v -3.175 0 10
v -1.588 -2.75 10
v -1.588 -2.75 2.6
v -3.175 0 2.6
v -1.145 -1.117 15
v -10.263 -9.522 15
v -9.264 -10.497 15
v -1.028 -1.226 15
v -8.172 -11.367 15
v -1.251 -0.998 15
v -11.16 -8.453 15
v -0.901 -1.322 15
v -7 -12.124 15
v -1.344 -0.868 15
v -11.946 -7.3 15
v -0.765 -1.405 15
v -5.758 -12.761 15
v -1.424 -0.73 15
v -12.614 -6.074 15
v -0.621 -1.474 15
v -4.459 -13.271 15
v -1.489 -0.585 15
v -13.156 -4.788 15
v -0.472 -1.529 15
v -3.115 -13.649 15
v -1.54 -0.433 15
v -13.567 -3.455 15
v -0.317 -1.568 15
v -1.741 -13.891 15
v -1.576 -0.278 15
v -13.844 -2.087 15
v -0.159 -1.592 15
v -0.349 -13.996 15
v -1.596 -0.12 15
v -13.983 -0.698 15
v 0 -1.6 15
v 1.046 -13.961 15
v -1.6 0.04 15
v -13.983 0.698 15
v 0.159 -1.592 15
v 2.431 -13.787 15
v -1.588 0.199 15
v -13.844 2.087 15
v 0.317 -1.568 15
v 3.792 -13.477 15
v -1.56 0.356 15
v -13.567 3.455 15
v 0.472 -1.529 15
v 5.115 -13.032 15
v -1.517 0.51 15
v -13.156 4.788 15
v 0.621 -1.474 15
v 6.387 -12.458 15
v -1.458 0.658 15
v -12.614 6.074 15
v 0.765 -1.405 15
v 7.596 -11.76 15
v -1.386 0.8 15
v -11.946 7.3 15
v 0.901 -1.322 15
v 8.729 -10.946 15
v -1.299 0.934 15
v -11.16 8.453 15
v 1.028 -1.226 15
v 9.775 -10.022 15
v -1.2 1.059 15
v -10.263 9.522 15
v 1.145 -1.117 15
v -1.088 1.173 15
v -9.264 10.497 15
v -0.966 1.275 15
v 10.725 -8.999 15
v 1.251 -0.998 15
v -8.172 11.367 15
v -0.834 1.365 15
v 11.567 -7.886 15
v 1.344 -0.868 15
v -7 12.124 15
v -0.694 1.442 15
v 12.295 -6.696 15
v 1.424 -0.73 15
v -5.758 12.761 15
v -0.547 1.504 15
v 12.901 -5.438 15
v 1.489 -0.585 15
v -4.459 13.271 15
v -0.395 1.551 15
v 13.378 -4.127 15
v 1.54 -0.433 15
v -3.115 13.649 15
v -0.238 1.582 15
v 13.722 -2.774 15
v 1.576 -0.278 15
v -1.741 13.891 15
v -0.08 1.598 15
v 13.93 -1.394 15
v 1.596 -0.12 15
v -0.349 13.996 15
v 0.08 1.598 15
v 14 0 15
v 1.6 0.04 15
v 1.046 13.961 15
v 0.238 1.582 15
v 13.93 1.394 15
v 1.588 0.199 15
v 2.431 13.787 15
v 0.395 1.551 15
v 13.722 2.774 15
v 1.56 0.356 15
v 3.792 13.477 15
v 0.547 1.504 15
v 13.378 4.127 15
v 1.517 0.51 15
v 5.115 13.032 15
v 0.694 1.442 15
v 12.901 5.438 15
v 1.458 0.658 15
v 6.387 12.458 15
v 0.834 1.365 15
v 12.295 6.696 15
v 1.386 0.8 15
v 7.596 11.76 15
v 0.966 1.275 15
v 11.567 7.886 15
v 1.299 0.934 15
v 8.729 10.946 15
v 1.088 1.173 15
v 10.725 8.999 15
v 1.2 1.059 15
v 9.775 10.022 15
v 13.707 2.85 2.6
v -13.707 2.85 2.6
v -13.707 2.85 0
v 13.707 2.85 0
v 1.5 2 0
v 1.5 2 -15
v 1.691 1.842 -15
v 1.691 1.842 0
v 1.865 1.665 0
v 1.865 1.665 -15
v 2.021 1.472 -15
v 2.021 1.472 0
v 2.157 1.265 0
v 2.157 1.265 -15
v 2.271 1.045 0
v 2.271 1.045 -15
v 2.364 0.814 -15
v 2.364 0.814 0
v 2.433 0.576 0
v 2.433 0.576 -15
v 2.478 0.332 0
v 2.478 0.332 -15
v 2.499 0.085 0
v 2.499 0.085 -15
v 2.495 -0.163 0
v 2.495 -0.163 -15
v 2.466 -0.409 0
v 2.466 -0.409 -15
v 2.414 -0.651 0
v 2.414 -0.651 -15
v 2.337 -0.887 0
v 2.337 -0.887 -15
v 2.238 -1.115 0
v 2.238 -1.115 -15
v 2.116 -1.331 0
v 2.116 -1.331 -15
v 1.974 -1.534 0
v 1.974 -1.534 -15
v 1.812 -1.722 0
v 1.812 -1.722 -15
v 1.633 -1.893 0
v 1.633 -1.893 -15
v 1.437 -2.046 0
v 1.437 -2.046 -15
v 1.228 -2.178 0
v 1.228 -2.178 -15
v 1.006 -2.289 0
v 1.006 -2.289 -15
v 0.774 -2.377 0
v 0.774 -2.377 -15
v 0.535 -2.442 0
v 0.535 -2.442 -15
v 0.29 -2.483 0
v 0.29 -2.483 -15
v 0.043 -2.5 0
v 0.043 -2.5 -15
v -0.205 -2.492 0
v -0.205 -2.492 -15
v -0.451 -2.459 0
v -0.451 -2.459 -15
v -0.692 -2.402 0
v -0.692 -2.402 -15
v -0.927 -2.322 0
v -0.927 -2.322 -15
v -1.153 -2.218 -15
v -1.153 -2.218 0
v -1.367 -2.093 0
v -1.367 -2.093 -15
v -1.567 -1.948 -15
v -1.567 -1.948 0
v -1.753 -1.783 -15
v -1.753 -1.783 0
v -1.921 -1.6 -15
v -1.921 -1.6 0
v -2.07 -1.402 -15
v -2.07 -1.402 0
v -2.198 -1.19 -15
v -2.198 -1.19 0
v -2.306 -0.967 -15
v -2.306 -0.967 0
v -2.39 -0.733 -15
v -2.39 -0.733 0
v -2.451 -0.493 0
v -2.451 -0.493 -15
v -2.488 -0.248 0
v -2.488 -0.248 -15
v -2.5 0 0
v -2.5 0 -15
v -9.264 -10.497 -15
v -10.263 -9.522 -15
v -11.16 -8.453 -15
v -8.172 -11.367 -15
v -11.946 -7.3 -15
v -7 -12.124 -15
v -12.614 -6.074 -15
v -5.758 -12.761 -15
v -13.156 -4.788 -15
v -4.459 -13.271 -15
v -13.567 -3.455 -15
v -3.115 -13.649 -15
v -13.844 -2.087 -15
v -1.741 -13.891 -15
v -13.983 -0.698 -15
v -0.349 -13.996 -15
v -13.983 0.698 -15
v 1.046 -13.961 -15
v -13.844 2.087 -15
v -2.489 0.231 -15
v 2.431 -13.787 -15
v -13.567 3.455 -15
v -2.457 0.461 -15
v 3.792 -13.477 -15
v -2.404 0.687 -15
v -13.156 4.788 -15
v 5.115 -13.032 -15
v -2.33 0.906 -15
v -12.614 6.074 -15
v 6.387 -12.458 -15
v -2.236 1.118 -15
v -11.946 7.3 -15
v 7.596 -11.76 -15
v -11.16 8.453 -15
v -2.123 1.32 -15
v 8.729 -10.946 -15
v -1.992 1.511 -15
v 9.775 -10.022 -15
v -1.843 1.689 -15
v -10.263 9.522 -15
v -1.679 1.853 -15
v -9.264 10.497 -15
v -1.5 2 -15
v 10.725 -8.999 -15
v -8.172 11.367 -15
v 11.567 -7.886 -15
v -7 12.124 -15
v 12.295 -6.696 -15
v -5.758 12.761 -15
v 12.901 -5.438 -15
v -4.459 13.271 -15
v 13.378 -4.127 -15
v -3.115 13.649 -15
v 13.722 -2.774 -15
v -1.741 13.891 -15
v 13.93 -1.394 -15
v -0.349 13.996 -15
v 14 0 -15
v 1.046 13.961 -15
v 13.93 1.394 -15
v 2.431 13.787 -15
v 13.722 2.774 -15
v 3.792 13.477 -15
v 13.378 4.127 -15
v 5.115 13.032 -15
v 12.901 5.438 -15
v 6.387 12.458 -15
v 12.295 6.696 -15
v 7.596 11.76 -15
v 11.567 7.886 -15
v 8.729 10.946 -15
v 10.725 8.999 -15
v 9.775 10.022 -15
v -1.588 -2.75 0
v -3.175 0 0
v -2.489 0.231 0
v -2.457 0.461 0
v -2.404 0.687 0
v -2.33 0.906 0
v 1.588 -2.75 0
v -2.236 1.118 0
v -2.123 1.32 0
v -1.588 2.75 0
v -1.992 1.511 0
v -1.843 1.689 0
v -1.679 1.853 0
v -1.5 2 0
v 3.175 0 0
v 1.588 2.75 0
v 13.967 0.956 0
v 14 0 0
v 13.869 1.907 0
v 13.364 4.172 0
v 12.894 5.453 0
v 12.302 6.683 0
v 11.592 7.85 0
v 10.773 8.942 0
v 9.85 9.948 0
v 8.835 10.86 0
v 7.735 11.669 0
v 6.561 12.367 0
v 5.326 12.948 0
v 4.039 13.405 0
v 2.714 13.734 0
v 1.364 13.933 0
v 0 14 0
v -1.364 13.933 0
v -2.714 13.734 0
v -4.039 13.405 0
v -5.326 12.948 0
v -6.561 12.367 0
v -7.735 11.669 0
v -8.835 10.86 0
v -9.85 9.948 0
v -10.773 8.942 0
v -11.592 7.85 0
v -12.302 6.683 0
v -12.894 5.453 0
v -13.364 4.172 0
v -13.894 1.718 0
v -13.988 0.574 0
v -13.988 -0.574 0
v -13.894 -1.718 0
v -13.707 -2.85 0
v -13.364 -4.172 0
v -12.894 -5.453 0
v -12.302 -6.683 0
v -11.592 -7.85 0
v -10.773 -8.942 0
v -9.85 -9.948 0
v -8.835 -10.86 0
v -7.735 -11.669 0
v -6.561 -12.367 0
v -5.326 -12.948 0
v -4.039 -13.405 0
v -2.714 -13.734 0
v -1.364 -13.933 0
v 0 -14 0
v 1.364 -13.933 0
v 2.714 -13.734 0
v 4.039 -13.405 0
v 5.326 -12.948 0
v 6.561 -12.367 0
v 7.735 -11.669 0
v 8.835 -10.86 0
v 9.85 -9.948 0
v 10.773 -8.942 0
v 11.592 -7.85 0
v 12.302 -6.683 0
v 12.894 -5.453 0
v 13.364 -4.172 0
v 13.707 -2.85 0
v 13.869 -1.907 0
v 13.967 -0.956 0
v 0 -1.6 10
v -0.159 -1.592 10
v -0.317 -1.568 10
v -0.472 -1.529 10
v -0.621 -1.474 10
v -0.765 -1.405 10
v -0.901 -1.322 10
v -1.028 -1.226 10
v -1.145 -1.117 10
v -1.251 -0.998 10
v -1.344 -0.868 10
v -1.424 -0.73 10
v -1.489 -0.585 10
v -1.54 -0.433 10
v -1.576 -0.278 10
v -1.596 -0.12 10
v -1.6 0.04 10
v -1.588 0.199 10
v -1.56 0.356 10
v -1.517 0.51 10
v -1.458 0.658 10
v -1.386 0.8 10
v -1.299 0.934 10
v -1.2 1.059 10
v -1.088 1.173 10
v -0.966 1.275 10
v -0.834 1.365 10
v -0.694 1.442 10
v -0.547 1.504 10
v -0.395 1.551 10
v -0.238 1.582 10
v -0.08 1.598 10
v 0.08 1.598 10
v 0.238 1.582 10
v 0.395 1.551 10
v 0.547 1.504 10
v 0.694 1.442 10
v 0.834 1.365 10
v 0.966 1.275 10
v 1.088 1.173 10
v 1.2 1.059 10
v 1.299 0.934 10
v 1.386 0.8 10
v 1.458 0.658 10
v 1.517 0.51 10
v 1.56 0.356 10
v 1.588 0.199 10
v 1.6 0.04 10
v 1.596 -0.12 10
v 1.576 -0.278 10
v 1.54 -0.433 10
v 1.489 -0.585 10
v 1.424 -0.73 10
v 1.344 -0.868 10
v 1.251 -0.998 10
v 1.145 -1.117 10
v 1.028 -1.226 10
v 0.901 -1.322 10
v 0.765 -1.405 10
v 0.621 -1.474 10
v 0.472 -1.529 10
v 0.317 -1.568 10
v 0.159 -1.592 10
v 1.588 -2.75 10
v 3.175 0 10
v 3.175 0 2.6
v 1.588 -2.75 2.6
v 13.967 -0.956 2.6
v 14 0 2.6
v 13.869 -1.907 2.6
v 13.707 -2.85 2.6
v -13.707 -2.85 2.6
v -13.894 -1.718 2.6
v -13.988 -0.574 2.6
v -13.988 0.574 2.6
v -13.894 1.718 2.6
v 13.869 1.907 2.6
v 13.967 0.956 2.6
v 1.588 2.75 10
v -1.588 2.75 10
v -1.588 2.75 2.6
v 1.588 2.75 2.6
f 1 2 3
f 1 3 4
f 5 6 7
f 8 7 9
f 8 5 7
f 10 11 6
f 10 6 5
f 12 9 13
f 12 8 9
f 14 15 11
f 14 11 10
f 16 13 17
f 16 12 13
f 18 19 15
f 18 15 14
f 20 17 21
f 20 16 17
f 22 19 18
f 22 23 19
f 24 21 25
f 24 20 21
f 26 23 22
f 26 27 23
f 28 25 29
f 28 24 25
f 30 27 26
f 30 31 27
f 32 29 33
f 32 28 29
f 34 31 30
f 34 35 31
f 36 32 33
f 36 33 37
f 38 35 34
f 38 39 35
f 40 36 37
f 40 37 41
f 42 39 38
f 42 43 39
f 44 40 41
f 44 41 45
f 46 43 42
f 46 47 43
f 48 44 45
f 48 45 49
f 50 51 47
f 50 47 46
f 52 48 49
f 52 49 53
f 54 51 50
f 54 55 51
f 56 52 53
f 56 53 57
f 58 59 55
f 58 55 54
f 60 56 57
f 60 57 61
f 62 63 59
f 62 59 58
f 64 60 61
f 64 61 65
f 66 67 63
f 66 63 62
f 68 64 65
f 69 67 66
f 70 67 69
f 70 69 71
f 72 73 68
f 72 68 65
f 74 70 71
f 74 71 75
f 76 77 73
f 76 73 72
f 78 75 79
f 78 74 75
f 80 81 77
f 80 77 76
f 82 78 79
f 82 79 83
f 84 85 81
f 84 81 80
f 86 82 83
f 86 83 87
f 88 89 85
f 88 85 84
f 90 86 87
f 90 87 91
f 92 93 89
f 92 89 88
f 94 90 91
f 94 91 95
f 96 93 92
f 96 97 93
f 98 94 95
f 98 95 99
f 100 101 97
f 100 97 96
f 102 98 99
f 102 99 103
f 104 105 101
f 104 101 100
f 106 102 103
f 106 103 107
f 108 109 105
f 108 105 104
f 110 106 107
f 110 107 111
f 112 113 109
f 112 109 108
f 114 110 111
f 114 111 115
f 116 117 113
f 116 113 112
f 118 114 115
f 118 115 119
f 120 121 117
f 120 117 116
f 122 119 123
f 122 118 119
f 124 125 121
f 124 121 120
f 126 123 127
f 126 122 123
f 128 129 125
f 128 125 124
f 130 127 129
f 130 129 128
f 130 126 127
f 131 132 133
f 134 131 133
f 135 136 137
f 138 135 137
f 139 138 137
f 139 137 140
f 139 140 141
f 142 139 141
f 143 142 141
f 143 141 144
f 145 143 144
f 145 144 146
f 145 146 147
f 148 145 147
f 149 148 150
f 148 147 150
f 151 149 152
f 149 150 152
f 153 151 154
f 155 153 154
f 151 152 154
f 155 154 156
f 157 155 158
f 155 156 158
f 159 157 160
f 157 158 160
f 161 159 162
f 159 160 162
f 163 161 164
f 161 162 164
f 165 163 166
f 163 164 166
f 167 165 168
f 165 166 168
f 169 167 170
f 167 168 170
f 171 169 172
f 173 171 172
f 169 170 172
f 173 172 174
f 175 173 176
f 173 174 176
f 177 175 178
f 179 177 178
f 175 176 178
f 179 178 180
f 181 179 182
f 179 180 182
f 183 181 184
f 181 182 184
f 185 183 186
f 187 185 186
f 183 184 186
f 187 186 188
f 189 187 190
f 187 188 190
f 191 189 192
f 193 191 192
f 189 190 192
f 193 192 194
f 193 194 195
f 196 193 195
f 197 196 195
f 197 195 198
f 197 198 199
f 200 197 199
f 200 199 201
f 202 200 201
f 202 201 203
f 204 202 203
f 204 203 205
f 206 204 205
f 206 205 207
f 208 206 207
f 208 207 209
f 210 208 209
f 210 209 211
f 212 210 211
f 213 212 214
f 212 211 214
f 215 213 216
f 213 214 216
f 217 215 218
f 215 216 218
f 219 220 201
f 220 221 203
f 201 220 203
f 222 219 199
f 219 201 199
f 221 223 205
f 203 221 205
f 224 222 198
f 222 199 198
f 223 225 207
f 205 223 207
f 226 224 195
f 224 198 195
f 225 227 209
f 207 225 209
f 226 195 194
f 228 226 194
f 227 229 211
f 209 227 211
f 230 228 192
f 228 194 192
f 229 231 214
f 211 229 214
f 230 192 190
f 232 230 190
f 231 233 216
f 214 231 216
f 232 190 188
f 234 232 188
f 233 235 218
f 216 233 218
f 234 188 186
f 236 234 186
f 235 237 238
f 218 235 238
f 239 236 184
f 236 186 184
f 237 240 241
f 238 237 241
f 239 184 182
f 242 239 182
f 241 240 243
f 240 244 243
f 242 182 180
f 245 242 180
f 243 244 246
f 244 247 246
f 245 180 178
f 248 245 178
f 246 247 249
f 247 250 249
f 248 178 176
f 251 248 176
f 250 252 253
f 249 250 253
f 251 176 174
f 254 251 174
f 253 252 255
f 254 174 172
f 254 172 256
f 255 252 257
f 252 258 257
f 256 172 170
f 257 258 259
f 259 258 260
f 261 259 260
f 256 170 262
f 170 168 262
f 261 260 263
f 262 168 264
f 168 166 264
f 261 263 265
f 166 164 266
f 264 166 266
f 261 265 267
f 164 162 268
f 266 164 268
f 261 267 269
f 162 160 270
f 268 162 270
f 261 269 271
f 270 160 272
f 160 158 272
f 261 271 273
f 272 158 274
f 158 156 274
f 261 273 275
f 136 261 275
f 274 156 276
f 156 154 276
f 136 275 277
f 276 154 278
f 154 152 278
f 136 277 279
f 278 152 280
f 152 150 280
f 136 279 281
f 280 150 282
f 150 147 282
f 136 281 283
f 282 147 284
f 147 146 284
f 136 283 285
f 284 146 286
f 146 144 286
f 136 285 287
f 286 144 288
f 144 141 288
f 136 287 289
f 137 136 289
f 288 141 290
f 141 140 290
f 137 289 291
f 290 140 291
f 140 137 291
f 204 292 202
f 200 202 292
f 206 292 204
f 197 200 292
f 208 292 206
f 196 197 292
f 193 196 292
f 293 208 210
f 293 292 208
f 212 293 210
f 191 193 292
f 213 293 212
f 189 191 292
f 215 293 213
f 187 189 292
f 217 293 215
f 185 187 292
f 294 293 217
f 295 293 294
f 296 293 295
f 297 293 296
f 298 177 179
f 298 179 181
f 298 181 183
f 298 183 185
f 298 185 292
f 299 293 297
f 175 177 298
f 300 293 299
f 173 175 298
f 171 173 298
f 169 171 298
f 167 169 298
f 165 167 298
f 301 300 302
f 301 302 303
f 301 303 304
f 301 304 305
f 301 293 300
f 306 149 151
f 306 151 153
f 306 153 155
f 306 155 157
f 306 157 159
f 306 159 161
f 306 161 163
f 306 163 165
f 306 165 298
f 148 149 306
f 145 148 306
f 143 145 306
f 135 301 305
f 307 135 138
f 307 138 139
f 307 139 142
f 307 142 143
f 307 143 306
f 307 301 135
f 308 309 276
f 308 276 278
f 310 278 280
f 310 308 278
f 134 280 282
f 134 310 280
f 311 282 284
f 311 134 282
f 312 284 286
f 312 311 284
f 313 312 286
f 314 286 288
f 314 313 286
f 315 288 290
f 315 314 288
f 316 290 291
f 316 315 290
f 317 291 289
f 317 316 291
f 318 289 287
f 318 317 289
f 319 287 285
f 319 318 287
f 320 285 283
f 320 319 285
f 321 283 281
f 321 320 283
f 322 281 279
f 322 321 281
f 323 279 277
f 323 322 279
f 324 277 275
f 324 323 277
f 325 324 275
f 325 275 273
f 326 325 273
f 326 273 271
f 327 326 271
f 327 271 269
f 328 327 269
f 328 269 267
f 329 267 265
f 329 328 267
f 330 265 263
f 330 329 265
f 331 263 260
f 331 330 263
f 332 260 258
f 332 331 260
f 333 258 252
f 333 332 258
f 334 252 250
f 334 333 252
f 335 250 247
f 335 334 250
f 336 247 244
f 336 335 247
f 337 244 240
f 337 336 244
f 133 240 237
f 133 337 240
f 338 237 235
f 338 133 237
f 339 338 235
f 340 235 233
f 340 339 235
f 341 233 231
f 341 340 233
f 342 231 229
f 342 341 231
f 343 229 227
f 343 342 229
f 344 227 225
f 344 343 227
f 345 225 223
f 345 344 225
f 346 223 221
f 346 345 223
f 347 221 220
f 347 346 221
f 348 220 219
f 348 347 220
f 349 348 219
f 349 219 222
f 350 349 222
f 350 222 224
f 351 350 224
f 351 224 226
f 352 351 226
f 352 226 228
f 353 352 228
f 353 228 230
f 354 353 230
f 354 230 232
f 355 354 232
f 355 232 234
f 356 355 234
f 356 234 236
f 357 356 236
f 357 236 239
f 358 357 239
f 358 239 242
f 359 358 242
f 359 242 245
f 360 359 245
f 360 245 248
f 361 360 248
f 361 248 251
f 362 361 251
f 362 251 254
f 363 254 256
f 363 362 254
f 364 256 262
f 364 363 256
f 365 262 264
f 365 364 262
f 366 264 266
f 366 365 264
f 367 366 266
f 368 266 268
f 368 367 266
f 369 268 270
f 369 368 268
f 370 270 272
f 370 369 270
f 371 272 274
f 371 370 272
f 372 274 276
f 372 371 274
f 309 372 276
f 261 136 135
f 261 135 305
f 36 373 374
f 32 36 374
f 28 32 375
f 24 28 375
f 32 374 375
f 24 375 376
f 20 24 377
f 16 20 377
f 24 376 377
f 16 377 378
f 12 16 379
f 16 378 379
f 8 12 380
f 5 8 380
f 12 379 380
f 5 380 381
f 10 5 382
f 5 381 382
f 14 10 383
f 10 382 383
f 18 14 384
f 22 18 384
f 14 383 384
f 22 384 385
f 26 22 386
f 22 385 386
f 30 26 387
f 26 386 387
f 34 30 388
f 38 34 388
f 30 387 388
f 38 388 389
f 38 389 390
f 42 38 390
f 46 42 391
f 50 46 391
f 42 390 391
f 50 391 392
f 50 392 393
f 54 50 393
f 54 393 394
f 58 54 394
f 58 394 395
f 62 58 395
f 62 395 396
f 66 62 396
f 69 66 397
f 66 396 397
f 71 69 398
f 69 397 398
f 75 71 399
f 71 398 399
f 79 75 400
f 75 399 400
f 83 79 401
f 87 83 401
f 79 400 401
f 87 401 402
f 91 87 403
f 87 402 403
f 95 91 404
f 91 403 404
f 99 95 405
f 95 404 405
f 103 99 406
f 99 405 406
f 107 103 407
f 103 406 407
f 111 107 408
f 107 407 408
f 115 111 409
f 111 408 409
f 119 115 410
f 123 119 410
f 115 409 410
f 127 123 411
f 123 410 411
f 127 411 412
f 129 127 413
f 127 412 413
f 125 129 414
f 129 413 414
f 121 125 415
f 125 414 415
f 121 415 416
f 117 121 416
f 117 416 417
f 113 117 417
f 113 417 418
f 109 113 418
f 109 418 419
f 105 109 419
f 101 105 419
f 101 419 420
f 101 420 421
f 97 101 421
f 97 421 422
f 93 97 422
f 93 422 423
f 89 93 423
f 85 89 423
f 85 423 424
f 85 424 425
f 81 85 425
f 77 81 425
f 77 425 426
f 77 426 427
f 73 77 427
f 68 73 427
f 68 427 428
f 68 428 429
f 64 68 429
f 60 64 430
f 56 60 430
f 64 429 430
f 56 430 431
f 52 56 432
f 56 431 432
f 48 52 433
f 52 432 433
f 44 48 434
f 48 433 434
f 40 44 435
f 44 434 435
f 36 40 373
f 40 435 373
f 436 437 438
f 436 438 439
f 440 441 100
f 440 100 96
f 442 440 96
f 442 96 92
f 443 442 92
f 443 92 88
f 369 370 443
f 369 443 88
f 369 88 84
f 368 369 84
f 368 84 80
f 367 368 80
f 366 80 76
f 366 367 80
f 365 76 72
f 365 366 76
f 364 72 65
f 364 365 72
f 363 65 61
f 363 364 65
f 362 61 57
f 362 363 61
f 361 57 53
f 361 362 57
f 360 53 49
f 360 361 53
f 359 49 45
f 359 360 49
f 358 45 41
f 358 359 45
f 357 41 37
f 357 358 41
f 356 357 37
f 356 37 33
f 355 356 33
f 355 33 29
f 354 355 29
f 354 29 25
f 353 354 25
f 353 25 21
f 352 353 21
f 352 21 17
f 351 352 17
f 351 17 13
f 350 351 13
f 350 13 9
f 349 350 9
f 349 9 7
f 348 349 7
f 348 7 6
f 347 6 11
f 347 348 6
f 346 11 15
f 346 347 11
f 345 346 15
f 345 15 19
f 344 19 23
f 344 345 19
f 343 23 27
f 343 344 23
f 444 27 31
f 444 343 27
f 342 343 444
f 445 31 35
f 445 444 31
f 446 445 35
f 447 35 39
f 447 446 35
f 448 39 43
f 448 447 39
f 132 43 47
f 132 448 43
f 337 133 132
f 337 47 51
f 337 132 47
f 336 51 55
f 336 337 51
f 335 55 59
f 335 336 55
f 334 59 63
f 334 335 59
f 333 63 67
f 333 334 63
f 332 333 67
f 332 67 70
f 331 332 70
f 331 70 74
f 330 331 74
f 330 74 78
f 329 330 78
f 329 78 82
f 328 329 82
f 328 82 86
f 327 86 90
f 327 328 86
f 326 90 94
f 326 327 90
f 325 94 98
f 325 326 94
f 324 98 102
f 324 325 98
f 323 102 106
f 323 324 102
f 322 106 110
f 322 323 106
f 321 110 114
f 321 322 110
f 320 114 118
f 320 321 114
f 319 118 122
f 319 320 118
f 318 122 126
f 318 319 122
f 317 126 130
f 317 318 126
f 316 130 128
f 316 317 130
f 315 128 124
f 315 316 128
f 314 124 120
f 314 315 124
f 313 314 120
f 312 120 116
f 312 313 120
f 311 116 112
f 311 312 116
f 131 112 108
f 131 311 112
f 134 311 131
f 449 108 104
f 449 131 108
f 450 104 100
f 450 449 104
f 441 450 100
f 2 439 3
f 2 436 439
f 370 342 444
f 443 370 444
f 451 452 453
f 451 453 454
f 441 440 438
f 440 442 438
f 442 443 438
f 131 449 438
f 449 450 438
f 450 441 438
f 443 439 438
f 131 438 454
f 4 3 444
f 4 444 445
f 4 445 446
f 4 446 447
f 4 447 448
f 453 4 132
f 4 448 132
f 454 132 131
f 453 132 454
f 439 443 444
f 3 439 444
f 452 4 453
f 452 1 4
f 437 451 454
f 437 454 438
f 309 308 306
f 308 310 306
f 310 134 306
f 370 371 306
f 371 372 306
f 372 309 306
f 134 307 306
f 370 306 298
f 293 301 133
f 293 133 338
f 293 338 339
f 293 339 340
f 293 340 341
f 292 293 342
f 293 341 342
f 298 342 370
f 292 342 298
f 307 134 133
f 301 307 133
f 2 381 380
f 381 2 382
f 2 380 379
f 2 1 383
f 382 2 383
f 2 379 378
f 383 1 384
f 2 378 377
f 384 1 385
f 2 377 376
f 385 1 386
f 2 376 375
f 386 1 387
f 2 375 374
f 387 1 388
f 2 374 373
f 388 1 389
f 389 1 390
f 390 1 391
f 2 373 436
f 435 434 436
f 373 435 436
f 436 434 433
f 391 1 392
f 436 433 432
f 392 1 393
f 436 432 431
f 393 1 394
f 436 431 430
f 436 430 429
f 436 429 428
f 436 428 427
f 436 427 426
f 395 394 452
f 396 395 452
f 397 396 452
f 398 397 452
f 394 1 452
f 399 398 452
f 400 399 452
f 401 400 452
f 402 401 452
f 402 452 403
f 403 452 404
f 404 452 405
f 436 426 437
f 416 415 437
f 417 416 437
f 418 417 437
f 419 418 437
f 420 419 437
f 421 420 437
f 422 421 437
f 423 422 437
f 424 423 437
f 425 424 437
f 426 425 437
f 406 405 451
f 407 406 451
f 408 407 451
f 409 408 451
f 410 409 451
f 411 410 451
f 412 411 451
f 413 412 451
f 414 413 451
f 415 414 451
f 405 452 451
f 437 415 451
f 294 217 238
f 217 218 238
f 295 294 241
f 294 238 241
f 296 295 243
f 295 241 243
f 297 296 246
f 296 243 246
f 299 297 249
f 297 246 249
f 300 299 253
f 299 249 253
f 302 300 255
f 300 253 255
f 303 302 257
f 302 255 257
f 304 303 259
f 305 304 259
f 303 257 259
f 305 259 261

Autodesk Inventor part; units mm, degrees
ref_plane "YZ Plane" through (0, 0, 0) normal (1, 0, 0) x (0, 1, 0)
ref_plane "XZ Plane" through (0, 0, 0) normal (0, 1, 0) x (-1, 0, 0)
ref_plane "XY Plane" through (0, 0, 0) normal (0, 0, 1) x (1, 0, 0)
sketch "Sketch2" plane through (0, 0, 0) normal (0, 0, 1) x (1, 0, 0)
  circle A0 centre (0, 0) radius 14
  dimension "d1" = 28
extrude "Extrusion1" add sketch "Sketch2" along normal mid plane 30
sketch "Sketch3" plane through (0, 0, 15) normal (0, 0, 1) x (1, 0, 0)
  point P0 (0, 0)
hole "Hole1" at (0, 0, 15) direction (0, 0, -1) diameter 3.2 depth 5 clearance for "Flat Head Machine Screw" size "M3" standard "Ansi Metric M Profile"
sketch "Sketch4" plane through (0, 0, 10) normal (0, 0, 1) x (1, 0, 0)
  circle A0 centre (0, 0) radius 1.6 projected
  line L0 (-1.5877, 2.75) -> (1.5877, 2.75)
  line L1 (1.5877, 2.75) -> (3.1754, 0)
  line L2 (3.1754, 0) -> (1.5877, -2.75)
  line L3 (1.5877, -2.75) -> (-1.5877, -2.75)
  line L4 (-1.5877, -2.75) -> (-3.1754, 0)
  line L5 (-3.1754, 0) -> (-1.5877, 2.75)
  dimension "d11" = 5.5
extrude "Extrusion2" cut sketch "Sketch4" against normal up to surface (10 mm away) contours A0 | L0 L1 L2 L3 L4 L5
sketch "Sketch5" plane through (0, 0, -15) normal (0, 0, -1) x (-1, 0, 0)
  circle A0 centre (0, 0) radius 2.5
  line L0 (-1.5, 2) -> (1.5, 2)
  dimension "d41" = 5
  dimension "d42" = 4.5
extrude "Extrusion3" cut sketch "Sketch5" against normal up to surface (15 mm away) contours A0 L0 picked at (0.1119, 0.5076)
sketch "Sketch8" plane through (0, 0, 0) normal (1, 0, 0) x (0, 1, 0)
  line L0 (2.85, 0) -> (-2.85, 0)
  line L1 (-2.85, 0) -> (-2.85, 2.6)
  line L2 (-2.85, 2.6) -> (2.85, 2.6)
  line L3 (2.85, 2.6) -> (2.85, 0)
  point P0 (0, 0)
  dimension "d48" = 2.6
  dimension "d49" = 5.7
extrude "Extrusion4" cut sketch "Sketch8" along normal through all both and the other way through all
equation "\"d30\" = 55deg"
equation "\"Sketch6_Pitch\" = 1.25"
properties part number "DestinationSpoolHolder"
